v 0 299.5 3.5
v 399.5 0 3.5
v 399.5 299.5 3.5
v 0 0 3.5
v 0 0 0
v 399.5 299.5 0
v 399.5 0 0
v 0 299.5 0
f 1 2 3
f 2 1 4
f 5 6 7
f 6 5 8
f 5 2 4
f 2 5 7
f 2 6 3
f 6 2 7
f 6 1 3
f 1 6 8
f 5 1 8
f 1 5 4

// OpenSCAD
// Rectangular backing plate. All dimensions in millimeters.
// Flat, uninterrupted faces: no grooves, ribs, embossing, or texture.
length_mm = 399.5;
width_mm = 299.5;
thickness_mm = 3.5;

assert(length_mm > 0 && width_mm > 0 && thickness_mm > 0,
       "All dimensions must be positive.");
cube([length_mm, width_mm, thickness_mm], center = false);
